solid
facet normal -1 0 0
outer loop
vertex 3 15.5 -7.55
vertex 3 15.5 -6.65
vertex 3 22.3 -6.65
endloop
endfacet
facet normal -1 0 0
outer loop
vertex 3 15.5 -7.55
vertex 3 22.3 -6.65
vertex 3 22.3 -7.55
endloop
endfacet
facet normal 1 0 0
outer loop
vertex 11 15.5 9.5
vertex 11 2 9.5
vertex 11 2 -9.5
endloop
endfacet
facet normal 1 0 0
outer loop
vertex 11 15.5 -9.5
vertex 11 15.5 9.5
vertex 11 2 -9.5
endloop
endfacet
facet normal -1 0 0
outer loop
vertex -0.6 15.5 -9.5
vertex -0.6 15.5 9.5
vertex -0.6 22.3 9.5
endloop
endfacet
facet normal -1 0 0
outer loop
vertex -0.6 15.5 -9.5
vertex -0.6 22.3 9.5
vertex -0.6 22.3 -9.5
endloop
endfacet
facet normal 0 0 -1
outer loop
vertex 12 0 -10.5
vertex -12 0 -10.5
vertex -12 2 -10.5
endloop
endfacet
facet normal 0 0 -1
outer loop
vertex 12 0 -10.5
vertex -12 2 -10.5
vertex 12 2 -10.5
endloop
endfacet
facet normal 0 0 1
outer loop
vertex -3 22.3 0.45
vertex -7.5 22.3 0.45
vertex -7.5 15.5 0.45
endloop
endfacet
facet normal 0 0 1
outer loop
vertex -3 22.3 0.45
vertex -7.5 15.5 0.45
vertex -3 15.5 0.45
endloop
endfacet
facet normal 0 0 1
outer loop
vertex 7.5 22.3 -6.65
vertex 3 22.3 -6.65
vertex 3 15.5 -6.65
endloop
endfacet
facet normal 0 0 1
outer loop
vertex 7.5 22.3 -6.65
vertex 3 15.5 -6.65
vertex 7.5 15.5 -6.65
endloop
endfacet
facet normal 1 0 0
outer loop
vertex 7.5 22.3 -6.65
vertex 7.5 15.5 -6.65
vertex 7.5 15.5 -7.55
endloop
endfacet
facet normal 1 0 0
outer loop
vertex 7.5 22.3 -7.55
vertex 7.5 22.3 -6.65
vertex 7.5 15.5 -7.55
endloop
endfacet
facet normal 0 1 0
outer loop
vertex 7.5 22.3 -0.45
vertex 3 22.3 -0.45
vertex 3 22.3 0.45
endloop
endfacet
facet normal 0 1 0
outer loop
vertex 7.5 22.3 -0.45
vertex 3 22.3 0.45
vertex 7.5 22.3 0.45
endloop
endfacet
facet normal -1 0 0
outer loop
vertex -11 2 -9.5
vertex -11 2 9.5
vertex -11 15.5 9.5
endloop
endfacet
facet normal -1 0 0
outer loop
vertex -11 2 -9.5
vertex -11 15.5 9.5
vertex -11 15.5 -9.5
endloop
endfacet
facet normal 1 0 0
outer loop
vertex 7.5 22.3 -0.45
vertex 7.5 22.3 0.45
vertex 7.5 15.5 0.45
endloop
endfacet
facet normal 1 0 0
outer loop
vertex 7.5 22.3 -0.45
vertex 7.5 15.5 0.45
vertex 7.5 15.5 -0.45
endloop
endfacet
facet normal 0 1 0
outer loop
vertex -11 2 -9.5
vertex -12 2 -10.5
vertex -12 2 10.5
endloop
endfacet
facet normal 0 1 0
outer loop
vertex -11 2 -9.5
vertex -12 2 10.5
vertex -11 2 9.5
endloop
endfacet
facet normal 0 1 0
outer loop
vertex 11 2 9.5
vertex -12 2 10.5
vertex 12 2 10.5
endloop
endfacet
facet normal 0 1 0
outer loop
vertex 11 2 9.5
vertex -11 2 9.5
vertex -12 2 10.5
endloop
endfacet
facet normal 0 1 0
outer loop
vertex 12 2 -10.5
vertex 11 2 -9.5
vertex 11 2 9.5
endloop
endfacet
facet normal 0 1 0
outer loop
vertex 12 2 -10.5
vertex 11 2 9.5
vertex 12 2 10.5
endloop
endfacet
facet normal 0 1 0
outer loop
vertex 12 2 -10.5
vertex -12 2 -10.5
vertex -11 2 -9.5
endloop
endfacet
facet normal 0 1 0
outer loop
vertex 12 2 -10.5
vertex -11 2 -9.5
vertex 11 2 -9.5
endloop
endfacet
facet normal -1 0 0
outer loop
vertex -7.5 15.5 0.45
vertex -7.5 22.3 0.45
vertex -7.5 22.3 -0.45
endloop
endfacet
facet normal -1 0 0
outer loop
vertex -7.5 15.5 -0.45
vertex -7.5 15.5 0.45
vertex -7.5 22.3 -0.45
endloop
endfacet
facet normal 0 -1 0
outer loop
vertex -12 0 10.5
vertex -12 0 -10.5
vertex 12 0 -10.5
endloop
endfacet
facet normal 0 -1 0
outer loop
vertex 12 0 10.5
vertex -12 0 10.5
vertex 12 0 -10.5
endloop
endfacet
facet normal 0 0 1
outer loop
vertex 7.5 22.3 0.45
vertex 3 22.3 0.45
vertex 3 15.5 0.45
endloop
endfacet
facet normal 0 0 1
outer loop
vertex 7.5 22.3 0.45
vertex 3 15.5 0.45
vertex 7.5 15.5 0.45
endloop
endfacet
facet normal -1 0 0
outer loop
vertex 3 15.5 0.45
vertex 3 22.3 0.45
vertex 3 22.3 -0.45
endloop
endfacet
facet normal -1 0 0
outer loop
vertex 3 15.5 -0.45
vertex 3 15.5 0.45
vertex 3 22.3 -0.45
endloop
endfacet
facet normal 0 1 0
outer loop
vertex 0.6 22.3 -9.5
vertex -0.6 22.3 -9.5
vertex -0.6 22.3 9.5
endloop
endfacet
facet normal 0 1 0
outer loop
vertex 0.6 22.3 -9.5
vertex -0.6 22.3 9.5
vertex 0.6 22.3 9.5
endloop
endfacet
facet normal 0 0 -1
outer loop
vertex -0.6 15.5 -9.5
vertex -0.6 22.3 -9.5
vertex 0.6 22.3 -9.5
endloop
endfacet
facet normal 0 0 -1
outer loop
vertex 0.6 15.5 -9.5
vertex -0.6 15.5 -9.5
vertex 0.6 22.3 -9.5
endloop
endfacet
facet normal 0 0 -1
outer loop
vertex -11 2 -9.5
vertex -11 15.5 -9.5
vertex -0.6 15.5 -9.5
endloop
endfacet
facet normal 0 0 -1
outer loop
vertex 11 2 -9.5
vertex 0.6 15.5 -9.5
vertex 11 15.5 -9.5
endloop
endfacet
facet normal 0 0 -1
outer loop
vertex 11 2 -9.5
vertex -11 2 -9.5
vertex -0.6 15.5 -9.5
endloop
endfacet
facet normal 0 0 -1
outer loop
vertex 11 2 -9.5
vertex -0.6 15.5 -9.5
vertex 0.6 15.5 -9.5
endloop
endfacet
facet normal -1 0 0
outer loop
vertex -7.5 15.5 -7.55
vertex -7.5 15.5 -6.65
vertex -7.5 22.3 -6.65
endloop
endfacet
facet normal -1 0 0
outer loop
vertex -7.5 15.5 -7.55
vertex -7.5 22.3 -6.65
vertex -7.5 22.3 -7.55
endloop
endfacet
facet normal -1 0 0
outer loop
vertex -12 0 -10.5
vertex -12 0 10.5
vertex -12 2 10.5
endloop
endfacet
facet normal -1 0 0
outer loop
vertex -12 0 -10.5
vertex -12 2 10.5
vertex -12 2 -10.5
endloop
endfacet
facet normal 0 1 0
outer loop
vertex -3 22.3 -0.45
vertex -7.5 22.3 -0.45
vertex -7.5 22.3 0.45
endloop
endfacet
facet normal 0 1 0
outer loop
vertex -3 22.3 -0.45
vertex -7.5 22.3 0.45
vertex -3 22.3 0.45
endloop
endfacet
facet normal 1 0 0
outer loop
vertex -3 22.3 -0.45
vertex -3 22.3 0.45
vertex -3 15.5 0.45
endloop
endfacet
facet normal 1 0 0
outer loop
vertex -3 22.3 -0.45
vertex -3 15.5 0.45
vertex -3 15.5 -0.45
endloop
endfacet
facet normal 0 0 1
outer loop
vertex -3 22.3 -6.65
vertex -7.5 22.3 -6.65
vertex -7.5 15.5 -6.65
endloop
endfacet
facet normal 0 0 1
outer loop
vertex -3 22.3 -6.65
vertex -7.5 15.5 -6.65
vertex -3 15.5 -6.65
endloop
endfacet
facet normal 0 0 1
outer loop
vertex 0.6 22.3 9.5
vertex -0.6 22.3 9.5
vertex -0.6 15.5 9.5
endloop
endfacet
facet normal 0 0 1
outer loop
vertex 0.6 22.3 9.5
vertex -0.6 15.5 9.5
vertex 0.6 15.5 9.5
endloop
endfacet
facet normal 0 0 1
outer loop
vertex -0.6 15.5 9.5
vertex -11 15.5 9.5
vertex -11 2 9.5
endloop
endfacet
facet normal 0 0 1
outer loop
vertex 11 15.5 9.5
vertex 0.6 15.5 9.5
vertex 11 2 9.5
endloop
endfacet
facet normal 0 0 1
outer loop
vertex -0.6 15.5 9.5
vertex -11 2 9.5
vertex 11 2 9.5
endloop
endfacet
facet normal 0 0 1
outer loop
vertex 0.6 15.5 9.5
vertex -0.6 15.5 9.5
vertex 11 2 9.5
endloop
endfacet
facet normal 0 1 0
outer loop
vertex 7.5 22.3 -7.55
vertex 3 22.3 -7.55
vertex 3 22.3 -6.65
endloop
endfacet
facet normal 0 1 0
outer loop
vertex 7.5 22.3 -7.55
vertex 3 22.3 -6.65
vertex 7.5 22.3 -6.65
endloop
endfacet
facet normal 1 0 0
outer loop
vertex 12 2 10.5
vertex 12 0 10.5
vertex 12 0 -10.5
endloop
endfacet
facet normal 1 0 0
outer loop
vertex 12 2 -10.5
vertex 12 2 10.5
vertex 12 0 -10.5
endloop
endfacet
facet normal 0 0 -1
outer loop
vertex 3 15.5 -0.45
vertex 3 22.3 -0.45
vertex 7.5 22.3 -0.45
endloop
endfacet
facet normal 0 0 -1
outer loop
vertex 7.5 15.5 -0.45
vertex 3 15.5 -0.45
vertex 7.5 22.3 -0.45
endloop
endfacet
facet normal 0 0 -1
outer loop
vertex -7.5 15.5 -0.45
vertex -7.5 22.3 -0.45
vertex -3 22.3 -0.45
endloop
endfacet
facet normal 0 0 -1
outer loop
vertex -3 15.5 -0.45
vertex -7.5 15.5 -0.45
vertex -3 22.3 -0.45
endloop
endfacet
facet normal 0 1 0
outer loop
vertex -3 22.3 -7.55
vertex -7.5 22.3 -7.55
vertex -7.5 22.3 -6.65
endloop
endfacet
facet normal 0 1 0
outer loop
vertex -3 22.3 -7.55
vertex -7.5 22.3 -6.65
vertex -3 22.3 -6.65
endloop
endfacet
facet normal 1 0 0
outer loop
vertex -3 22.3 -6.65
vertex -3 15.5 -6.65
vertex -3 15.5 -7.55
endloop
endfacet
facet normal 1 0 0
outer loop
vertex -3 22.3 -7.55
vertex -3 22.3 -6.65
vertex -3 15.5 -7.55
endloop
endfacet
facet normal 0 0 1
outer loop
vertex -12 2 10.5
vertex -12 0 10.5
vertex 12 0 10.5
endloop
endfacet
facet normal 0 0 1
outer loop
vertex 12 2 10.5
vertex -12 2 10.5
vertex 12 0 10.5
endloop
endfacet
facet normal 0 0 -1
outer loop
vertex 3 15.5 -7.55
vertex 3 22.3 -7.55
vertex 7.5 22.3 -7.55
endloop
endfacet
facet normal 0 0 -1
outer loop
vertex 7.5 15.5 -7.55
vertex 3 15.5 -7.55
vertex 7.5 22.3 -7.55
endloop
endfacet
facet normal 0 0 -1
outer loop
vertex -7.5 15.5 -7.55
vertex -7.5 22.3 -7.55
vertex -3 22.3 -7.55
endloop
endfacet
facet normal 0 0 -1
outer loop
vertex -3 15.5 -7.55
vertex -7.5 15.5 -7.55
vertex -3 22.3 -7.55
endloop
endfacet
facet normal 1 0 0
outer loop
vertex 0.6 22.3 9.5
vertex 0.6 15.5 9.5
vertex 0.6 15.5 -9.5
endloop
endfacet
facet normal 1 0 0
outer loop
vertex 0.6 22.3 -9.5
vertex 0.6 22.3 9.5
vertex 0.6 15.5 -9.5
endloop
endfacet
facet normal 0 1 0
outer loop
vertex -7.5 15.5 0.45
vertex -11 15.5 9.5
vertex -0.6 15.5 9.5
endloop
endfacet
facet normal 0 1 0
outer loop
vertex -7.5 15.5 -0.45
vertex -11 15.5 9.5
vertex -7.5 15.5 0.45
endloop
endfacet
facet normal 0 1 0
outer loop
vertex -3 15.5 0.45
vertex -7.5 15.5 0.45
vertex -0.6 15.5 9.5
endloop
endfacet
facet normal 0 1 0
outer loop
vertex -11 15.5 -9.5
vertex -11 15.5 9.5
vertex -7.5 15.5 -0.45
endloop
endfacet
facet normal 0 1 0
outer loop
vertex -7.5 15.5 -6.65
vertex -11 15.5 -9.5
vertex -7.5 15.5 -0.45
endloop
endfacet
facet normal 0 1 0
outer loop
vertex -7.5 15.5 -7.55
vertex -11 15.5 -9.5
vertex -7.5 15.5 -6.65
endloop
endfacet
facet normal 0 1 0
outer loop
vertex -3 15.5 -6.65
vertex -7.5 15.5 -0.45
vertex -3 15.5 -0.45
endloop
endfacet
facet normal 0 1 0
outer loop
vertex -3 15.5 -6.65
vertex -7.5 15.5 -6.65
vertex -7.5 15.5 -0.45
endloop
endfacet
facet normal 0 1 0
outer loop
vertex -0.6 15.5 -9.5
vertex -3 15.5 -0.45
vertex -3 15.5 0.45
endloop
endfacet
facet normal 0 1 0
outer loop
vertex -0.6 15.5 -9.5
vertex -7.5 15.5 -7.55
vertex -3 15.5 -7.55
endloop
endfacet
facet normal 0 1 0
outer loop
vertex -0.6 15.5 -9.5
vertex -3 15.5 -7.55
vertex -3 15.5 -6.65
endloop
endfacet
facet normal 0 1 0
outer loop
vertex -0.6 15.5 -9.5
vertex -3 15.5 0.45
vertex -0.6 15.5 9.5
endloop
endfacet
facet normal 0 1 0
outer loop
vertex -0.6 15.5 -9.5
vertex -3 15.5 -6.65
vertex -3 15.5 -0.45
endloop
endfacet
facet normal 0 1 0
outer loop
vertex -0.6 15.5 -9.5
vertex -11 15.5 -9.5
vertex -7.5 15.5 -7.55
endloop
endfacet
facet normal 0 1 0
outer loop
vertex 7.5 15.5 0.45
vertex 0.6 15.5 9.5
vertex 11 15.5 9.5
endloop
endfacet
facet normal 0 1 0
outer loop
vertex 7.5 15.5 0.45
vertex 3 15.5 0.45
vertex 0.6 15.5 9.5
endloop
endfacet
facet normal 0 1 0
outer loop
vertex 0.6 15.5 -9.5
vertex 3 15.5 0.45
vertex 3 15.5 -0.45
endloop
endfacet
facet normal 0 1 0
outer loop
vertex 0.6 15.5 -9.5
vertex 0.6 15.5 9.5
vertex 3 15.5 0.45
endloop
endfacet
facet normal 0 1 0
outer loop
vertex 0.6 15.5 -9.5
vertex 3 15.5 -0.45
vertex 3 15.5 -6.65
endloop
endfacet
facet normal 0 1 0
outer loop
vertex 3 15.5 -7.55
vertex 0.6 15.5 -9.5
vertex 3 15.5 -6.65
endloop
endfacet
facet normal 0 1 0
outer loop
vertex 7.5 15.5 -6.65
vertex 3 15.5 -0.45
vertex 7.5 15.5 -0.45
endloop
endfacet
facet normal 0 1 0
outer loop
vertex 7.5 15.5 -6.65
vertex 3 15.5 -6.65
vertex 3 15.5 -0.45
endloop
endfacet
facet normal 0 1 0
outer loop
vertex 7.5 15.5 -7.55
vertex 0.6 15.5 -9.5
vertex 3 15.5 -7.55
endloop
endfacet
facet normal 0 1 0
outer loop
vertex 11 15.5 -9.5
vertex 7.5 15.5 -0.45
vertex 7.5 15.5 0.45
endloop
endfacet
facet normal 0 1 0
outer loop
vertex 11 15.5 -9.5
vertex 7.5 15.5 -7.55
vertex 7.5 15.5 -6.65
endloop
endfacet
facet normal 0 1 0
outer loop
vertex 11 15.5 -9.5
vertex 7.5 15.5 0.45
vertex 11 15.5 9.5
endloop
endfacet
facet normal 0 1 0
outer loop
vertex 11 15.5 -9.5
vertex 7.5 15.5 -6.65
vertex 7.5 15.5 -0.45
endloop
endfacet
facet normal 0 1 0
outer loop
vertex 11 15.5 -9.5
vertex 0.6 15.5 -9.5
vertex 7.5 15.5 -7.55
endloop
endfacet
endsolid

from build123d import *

# Parameters (mm, degrees)
SKETCH1_W           = 24
SKETCH1_H           = 21
BOSS_EXTRUDE1_DEPTH = 2
SKETCH2_W           = 22
SKETCH2_H           = 19
BOSS_EXTRUDE2_DEPTH = 13.5
SKETCH3_W           = 1.2
SKETCH3_H           = 19
BOSS_EXTRUDE3_DEPTH = 6.8
SKETCH4_W           = 4.5
SKETCH4_H           = 0.9
BOSS_EXTRUDE4_DEPTH = 6.8


with BuildPart() as part:
    # Sketch1 → Boss-Extrude1 (new body)
    with BuildSketch(Plane(origin=(0, 0, 0), x_dir=(1, 0, 0), z_dir=(0, 1, 0))):
        Rectangle(SKETCH1_W, SKETCH1_H)
    extrude(amount=BOSS_EXTRUDE1_DEPTH)

    # Sketch2 → Boss-Extrude2 (add)
    with BuildSketch(Plane(origin=(0, 2, 0), x_dir=(1, 0, 0), z_dir=(0, 1, 0))):
        Rectangle(SKETCH2_W, SKETCH2_H)
    extrude(amount=BOSS_EXTRUDE2_DEPTH)

    # Sketch3 → Boss-Extrude3 (add)
    with BuildSketch(Plane(origin=(0, 15.5, 0), x_dir=(1, 0, 0), z_dir=(0, 1, 0))):
        Rectangle(SKETCH3_W, SKETCH3_H)
    extrude(amount=BOSS_EXTRUDE3_DEPTH)

    # Sketch4 → Boss-Extrude4 (add)
    with BuildSketch(Plane(origin=(0, 15.5, 0), x_dir=(1, 0, 0), z_dir=(0, 1, 0))):
        with Locations((-5.25, 7.1)):
            Rectangle(SKETCH4_W, SKETCH4_H)
        with Locations((-5.25, 0)):
            Rectangle(SKETCH4_W, SKETCH4_H)
        with Locations((5.25, 7.1)):
            Rectangle(SKETCH4_W, SKETCH4_H)
        with Locations((5.25, 0)):
            Rectangle(SKETCH4_W, SKETCH4_H)
    extrude(amount=BOSS_EXTRUDE4_DEPTH)


solid = part.part
